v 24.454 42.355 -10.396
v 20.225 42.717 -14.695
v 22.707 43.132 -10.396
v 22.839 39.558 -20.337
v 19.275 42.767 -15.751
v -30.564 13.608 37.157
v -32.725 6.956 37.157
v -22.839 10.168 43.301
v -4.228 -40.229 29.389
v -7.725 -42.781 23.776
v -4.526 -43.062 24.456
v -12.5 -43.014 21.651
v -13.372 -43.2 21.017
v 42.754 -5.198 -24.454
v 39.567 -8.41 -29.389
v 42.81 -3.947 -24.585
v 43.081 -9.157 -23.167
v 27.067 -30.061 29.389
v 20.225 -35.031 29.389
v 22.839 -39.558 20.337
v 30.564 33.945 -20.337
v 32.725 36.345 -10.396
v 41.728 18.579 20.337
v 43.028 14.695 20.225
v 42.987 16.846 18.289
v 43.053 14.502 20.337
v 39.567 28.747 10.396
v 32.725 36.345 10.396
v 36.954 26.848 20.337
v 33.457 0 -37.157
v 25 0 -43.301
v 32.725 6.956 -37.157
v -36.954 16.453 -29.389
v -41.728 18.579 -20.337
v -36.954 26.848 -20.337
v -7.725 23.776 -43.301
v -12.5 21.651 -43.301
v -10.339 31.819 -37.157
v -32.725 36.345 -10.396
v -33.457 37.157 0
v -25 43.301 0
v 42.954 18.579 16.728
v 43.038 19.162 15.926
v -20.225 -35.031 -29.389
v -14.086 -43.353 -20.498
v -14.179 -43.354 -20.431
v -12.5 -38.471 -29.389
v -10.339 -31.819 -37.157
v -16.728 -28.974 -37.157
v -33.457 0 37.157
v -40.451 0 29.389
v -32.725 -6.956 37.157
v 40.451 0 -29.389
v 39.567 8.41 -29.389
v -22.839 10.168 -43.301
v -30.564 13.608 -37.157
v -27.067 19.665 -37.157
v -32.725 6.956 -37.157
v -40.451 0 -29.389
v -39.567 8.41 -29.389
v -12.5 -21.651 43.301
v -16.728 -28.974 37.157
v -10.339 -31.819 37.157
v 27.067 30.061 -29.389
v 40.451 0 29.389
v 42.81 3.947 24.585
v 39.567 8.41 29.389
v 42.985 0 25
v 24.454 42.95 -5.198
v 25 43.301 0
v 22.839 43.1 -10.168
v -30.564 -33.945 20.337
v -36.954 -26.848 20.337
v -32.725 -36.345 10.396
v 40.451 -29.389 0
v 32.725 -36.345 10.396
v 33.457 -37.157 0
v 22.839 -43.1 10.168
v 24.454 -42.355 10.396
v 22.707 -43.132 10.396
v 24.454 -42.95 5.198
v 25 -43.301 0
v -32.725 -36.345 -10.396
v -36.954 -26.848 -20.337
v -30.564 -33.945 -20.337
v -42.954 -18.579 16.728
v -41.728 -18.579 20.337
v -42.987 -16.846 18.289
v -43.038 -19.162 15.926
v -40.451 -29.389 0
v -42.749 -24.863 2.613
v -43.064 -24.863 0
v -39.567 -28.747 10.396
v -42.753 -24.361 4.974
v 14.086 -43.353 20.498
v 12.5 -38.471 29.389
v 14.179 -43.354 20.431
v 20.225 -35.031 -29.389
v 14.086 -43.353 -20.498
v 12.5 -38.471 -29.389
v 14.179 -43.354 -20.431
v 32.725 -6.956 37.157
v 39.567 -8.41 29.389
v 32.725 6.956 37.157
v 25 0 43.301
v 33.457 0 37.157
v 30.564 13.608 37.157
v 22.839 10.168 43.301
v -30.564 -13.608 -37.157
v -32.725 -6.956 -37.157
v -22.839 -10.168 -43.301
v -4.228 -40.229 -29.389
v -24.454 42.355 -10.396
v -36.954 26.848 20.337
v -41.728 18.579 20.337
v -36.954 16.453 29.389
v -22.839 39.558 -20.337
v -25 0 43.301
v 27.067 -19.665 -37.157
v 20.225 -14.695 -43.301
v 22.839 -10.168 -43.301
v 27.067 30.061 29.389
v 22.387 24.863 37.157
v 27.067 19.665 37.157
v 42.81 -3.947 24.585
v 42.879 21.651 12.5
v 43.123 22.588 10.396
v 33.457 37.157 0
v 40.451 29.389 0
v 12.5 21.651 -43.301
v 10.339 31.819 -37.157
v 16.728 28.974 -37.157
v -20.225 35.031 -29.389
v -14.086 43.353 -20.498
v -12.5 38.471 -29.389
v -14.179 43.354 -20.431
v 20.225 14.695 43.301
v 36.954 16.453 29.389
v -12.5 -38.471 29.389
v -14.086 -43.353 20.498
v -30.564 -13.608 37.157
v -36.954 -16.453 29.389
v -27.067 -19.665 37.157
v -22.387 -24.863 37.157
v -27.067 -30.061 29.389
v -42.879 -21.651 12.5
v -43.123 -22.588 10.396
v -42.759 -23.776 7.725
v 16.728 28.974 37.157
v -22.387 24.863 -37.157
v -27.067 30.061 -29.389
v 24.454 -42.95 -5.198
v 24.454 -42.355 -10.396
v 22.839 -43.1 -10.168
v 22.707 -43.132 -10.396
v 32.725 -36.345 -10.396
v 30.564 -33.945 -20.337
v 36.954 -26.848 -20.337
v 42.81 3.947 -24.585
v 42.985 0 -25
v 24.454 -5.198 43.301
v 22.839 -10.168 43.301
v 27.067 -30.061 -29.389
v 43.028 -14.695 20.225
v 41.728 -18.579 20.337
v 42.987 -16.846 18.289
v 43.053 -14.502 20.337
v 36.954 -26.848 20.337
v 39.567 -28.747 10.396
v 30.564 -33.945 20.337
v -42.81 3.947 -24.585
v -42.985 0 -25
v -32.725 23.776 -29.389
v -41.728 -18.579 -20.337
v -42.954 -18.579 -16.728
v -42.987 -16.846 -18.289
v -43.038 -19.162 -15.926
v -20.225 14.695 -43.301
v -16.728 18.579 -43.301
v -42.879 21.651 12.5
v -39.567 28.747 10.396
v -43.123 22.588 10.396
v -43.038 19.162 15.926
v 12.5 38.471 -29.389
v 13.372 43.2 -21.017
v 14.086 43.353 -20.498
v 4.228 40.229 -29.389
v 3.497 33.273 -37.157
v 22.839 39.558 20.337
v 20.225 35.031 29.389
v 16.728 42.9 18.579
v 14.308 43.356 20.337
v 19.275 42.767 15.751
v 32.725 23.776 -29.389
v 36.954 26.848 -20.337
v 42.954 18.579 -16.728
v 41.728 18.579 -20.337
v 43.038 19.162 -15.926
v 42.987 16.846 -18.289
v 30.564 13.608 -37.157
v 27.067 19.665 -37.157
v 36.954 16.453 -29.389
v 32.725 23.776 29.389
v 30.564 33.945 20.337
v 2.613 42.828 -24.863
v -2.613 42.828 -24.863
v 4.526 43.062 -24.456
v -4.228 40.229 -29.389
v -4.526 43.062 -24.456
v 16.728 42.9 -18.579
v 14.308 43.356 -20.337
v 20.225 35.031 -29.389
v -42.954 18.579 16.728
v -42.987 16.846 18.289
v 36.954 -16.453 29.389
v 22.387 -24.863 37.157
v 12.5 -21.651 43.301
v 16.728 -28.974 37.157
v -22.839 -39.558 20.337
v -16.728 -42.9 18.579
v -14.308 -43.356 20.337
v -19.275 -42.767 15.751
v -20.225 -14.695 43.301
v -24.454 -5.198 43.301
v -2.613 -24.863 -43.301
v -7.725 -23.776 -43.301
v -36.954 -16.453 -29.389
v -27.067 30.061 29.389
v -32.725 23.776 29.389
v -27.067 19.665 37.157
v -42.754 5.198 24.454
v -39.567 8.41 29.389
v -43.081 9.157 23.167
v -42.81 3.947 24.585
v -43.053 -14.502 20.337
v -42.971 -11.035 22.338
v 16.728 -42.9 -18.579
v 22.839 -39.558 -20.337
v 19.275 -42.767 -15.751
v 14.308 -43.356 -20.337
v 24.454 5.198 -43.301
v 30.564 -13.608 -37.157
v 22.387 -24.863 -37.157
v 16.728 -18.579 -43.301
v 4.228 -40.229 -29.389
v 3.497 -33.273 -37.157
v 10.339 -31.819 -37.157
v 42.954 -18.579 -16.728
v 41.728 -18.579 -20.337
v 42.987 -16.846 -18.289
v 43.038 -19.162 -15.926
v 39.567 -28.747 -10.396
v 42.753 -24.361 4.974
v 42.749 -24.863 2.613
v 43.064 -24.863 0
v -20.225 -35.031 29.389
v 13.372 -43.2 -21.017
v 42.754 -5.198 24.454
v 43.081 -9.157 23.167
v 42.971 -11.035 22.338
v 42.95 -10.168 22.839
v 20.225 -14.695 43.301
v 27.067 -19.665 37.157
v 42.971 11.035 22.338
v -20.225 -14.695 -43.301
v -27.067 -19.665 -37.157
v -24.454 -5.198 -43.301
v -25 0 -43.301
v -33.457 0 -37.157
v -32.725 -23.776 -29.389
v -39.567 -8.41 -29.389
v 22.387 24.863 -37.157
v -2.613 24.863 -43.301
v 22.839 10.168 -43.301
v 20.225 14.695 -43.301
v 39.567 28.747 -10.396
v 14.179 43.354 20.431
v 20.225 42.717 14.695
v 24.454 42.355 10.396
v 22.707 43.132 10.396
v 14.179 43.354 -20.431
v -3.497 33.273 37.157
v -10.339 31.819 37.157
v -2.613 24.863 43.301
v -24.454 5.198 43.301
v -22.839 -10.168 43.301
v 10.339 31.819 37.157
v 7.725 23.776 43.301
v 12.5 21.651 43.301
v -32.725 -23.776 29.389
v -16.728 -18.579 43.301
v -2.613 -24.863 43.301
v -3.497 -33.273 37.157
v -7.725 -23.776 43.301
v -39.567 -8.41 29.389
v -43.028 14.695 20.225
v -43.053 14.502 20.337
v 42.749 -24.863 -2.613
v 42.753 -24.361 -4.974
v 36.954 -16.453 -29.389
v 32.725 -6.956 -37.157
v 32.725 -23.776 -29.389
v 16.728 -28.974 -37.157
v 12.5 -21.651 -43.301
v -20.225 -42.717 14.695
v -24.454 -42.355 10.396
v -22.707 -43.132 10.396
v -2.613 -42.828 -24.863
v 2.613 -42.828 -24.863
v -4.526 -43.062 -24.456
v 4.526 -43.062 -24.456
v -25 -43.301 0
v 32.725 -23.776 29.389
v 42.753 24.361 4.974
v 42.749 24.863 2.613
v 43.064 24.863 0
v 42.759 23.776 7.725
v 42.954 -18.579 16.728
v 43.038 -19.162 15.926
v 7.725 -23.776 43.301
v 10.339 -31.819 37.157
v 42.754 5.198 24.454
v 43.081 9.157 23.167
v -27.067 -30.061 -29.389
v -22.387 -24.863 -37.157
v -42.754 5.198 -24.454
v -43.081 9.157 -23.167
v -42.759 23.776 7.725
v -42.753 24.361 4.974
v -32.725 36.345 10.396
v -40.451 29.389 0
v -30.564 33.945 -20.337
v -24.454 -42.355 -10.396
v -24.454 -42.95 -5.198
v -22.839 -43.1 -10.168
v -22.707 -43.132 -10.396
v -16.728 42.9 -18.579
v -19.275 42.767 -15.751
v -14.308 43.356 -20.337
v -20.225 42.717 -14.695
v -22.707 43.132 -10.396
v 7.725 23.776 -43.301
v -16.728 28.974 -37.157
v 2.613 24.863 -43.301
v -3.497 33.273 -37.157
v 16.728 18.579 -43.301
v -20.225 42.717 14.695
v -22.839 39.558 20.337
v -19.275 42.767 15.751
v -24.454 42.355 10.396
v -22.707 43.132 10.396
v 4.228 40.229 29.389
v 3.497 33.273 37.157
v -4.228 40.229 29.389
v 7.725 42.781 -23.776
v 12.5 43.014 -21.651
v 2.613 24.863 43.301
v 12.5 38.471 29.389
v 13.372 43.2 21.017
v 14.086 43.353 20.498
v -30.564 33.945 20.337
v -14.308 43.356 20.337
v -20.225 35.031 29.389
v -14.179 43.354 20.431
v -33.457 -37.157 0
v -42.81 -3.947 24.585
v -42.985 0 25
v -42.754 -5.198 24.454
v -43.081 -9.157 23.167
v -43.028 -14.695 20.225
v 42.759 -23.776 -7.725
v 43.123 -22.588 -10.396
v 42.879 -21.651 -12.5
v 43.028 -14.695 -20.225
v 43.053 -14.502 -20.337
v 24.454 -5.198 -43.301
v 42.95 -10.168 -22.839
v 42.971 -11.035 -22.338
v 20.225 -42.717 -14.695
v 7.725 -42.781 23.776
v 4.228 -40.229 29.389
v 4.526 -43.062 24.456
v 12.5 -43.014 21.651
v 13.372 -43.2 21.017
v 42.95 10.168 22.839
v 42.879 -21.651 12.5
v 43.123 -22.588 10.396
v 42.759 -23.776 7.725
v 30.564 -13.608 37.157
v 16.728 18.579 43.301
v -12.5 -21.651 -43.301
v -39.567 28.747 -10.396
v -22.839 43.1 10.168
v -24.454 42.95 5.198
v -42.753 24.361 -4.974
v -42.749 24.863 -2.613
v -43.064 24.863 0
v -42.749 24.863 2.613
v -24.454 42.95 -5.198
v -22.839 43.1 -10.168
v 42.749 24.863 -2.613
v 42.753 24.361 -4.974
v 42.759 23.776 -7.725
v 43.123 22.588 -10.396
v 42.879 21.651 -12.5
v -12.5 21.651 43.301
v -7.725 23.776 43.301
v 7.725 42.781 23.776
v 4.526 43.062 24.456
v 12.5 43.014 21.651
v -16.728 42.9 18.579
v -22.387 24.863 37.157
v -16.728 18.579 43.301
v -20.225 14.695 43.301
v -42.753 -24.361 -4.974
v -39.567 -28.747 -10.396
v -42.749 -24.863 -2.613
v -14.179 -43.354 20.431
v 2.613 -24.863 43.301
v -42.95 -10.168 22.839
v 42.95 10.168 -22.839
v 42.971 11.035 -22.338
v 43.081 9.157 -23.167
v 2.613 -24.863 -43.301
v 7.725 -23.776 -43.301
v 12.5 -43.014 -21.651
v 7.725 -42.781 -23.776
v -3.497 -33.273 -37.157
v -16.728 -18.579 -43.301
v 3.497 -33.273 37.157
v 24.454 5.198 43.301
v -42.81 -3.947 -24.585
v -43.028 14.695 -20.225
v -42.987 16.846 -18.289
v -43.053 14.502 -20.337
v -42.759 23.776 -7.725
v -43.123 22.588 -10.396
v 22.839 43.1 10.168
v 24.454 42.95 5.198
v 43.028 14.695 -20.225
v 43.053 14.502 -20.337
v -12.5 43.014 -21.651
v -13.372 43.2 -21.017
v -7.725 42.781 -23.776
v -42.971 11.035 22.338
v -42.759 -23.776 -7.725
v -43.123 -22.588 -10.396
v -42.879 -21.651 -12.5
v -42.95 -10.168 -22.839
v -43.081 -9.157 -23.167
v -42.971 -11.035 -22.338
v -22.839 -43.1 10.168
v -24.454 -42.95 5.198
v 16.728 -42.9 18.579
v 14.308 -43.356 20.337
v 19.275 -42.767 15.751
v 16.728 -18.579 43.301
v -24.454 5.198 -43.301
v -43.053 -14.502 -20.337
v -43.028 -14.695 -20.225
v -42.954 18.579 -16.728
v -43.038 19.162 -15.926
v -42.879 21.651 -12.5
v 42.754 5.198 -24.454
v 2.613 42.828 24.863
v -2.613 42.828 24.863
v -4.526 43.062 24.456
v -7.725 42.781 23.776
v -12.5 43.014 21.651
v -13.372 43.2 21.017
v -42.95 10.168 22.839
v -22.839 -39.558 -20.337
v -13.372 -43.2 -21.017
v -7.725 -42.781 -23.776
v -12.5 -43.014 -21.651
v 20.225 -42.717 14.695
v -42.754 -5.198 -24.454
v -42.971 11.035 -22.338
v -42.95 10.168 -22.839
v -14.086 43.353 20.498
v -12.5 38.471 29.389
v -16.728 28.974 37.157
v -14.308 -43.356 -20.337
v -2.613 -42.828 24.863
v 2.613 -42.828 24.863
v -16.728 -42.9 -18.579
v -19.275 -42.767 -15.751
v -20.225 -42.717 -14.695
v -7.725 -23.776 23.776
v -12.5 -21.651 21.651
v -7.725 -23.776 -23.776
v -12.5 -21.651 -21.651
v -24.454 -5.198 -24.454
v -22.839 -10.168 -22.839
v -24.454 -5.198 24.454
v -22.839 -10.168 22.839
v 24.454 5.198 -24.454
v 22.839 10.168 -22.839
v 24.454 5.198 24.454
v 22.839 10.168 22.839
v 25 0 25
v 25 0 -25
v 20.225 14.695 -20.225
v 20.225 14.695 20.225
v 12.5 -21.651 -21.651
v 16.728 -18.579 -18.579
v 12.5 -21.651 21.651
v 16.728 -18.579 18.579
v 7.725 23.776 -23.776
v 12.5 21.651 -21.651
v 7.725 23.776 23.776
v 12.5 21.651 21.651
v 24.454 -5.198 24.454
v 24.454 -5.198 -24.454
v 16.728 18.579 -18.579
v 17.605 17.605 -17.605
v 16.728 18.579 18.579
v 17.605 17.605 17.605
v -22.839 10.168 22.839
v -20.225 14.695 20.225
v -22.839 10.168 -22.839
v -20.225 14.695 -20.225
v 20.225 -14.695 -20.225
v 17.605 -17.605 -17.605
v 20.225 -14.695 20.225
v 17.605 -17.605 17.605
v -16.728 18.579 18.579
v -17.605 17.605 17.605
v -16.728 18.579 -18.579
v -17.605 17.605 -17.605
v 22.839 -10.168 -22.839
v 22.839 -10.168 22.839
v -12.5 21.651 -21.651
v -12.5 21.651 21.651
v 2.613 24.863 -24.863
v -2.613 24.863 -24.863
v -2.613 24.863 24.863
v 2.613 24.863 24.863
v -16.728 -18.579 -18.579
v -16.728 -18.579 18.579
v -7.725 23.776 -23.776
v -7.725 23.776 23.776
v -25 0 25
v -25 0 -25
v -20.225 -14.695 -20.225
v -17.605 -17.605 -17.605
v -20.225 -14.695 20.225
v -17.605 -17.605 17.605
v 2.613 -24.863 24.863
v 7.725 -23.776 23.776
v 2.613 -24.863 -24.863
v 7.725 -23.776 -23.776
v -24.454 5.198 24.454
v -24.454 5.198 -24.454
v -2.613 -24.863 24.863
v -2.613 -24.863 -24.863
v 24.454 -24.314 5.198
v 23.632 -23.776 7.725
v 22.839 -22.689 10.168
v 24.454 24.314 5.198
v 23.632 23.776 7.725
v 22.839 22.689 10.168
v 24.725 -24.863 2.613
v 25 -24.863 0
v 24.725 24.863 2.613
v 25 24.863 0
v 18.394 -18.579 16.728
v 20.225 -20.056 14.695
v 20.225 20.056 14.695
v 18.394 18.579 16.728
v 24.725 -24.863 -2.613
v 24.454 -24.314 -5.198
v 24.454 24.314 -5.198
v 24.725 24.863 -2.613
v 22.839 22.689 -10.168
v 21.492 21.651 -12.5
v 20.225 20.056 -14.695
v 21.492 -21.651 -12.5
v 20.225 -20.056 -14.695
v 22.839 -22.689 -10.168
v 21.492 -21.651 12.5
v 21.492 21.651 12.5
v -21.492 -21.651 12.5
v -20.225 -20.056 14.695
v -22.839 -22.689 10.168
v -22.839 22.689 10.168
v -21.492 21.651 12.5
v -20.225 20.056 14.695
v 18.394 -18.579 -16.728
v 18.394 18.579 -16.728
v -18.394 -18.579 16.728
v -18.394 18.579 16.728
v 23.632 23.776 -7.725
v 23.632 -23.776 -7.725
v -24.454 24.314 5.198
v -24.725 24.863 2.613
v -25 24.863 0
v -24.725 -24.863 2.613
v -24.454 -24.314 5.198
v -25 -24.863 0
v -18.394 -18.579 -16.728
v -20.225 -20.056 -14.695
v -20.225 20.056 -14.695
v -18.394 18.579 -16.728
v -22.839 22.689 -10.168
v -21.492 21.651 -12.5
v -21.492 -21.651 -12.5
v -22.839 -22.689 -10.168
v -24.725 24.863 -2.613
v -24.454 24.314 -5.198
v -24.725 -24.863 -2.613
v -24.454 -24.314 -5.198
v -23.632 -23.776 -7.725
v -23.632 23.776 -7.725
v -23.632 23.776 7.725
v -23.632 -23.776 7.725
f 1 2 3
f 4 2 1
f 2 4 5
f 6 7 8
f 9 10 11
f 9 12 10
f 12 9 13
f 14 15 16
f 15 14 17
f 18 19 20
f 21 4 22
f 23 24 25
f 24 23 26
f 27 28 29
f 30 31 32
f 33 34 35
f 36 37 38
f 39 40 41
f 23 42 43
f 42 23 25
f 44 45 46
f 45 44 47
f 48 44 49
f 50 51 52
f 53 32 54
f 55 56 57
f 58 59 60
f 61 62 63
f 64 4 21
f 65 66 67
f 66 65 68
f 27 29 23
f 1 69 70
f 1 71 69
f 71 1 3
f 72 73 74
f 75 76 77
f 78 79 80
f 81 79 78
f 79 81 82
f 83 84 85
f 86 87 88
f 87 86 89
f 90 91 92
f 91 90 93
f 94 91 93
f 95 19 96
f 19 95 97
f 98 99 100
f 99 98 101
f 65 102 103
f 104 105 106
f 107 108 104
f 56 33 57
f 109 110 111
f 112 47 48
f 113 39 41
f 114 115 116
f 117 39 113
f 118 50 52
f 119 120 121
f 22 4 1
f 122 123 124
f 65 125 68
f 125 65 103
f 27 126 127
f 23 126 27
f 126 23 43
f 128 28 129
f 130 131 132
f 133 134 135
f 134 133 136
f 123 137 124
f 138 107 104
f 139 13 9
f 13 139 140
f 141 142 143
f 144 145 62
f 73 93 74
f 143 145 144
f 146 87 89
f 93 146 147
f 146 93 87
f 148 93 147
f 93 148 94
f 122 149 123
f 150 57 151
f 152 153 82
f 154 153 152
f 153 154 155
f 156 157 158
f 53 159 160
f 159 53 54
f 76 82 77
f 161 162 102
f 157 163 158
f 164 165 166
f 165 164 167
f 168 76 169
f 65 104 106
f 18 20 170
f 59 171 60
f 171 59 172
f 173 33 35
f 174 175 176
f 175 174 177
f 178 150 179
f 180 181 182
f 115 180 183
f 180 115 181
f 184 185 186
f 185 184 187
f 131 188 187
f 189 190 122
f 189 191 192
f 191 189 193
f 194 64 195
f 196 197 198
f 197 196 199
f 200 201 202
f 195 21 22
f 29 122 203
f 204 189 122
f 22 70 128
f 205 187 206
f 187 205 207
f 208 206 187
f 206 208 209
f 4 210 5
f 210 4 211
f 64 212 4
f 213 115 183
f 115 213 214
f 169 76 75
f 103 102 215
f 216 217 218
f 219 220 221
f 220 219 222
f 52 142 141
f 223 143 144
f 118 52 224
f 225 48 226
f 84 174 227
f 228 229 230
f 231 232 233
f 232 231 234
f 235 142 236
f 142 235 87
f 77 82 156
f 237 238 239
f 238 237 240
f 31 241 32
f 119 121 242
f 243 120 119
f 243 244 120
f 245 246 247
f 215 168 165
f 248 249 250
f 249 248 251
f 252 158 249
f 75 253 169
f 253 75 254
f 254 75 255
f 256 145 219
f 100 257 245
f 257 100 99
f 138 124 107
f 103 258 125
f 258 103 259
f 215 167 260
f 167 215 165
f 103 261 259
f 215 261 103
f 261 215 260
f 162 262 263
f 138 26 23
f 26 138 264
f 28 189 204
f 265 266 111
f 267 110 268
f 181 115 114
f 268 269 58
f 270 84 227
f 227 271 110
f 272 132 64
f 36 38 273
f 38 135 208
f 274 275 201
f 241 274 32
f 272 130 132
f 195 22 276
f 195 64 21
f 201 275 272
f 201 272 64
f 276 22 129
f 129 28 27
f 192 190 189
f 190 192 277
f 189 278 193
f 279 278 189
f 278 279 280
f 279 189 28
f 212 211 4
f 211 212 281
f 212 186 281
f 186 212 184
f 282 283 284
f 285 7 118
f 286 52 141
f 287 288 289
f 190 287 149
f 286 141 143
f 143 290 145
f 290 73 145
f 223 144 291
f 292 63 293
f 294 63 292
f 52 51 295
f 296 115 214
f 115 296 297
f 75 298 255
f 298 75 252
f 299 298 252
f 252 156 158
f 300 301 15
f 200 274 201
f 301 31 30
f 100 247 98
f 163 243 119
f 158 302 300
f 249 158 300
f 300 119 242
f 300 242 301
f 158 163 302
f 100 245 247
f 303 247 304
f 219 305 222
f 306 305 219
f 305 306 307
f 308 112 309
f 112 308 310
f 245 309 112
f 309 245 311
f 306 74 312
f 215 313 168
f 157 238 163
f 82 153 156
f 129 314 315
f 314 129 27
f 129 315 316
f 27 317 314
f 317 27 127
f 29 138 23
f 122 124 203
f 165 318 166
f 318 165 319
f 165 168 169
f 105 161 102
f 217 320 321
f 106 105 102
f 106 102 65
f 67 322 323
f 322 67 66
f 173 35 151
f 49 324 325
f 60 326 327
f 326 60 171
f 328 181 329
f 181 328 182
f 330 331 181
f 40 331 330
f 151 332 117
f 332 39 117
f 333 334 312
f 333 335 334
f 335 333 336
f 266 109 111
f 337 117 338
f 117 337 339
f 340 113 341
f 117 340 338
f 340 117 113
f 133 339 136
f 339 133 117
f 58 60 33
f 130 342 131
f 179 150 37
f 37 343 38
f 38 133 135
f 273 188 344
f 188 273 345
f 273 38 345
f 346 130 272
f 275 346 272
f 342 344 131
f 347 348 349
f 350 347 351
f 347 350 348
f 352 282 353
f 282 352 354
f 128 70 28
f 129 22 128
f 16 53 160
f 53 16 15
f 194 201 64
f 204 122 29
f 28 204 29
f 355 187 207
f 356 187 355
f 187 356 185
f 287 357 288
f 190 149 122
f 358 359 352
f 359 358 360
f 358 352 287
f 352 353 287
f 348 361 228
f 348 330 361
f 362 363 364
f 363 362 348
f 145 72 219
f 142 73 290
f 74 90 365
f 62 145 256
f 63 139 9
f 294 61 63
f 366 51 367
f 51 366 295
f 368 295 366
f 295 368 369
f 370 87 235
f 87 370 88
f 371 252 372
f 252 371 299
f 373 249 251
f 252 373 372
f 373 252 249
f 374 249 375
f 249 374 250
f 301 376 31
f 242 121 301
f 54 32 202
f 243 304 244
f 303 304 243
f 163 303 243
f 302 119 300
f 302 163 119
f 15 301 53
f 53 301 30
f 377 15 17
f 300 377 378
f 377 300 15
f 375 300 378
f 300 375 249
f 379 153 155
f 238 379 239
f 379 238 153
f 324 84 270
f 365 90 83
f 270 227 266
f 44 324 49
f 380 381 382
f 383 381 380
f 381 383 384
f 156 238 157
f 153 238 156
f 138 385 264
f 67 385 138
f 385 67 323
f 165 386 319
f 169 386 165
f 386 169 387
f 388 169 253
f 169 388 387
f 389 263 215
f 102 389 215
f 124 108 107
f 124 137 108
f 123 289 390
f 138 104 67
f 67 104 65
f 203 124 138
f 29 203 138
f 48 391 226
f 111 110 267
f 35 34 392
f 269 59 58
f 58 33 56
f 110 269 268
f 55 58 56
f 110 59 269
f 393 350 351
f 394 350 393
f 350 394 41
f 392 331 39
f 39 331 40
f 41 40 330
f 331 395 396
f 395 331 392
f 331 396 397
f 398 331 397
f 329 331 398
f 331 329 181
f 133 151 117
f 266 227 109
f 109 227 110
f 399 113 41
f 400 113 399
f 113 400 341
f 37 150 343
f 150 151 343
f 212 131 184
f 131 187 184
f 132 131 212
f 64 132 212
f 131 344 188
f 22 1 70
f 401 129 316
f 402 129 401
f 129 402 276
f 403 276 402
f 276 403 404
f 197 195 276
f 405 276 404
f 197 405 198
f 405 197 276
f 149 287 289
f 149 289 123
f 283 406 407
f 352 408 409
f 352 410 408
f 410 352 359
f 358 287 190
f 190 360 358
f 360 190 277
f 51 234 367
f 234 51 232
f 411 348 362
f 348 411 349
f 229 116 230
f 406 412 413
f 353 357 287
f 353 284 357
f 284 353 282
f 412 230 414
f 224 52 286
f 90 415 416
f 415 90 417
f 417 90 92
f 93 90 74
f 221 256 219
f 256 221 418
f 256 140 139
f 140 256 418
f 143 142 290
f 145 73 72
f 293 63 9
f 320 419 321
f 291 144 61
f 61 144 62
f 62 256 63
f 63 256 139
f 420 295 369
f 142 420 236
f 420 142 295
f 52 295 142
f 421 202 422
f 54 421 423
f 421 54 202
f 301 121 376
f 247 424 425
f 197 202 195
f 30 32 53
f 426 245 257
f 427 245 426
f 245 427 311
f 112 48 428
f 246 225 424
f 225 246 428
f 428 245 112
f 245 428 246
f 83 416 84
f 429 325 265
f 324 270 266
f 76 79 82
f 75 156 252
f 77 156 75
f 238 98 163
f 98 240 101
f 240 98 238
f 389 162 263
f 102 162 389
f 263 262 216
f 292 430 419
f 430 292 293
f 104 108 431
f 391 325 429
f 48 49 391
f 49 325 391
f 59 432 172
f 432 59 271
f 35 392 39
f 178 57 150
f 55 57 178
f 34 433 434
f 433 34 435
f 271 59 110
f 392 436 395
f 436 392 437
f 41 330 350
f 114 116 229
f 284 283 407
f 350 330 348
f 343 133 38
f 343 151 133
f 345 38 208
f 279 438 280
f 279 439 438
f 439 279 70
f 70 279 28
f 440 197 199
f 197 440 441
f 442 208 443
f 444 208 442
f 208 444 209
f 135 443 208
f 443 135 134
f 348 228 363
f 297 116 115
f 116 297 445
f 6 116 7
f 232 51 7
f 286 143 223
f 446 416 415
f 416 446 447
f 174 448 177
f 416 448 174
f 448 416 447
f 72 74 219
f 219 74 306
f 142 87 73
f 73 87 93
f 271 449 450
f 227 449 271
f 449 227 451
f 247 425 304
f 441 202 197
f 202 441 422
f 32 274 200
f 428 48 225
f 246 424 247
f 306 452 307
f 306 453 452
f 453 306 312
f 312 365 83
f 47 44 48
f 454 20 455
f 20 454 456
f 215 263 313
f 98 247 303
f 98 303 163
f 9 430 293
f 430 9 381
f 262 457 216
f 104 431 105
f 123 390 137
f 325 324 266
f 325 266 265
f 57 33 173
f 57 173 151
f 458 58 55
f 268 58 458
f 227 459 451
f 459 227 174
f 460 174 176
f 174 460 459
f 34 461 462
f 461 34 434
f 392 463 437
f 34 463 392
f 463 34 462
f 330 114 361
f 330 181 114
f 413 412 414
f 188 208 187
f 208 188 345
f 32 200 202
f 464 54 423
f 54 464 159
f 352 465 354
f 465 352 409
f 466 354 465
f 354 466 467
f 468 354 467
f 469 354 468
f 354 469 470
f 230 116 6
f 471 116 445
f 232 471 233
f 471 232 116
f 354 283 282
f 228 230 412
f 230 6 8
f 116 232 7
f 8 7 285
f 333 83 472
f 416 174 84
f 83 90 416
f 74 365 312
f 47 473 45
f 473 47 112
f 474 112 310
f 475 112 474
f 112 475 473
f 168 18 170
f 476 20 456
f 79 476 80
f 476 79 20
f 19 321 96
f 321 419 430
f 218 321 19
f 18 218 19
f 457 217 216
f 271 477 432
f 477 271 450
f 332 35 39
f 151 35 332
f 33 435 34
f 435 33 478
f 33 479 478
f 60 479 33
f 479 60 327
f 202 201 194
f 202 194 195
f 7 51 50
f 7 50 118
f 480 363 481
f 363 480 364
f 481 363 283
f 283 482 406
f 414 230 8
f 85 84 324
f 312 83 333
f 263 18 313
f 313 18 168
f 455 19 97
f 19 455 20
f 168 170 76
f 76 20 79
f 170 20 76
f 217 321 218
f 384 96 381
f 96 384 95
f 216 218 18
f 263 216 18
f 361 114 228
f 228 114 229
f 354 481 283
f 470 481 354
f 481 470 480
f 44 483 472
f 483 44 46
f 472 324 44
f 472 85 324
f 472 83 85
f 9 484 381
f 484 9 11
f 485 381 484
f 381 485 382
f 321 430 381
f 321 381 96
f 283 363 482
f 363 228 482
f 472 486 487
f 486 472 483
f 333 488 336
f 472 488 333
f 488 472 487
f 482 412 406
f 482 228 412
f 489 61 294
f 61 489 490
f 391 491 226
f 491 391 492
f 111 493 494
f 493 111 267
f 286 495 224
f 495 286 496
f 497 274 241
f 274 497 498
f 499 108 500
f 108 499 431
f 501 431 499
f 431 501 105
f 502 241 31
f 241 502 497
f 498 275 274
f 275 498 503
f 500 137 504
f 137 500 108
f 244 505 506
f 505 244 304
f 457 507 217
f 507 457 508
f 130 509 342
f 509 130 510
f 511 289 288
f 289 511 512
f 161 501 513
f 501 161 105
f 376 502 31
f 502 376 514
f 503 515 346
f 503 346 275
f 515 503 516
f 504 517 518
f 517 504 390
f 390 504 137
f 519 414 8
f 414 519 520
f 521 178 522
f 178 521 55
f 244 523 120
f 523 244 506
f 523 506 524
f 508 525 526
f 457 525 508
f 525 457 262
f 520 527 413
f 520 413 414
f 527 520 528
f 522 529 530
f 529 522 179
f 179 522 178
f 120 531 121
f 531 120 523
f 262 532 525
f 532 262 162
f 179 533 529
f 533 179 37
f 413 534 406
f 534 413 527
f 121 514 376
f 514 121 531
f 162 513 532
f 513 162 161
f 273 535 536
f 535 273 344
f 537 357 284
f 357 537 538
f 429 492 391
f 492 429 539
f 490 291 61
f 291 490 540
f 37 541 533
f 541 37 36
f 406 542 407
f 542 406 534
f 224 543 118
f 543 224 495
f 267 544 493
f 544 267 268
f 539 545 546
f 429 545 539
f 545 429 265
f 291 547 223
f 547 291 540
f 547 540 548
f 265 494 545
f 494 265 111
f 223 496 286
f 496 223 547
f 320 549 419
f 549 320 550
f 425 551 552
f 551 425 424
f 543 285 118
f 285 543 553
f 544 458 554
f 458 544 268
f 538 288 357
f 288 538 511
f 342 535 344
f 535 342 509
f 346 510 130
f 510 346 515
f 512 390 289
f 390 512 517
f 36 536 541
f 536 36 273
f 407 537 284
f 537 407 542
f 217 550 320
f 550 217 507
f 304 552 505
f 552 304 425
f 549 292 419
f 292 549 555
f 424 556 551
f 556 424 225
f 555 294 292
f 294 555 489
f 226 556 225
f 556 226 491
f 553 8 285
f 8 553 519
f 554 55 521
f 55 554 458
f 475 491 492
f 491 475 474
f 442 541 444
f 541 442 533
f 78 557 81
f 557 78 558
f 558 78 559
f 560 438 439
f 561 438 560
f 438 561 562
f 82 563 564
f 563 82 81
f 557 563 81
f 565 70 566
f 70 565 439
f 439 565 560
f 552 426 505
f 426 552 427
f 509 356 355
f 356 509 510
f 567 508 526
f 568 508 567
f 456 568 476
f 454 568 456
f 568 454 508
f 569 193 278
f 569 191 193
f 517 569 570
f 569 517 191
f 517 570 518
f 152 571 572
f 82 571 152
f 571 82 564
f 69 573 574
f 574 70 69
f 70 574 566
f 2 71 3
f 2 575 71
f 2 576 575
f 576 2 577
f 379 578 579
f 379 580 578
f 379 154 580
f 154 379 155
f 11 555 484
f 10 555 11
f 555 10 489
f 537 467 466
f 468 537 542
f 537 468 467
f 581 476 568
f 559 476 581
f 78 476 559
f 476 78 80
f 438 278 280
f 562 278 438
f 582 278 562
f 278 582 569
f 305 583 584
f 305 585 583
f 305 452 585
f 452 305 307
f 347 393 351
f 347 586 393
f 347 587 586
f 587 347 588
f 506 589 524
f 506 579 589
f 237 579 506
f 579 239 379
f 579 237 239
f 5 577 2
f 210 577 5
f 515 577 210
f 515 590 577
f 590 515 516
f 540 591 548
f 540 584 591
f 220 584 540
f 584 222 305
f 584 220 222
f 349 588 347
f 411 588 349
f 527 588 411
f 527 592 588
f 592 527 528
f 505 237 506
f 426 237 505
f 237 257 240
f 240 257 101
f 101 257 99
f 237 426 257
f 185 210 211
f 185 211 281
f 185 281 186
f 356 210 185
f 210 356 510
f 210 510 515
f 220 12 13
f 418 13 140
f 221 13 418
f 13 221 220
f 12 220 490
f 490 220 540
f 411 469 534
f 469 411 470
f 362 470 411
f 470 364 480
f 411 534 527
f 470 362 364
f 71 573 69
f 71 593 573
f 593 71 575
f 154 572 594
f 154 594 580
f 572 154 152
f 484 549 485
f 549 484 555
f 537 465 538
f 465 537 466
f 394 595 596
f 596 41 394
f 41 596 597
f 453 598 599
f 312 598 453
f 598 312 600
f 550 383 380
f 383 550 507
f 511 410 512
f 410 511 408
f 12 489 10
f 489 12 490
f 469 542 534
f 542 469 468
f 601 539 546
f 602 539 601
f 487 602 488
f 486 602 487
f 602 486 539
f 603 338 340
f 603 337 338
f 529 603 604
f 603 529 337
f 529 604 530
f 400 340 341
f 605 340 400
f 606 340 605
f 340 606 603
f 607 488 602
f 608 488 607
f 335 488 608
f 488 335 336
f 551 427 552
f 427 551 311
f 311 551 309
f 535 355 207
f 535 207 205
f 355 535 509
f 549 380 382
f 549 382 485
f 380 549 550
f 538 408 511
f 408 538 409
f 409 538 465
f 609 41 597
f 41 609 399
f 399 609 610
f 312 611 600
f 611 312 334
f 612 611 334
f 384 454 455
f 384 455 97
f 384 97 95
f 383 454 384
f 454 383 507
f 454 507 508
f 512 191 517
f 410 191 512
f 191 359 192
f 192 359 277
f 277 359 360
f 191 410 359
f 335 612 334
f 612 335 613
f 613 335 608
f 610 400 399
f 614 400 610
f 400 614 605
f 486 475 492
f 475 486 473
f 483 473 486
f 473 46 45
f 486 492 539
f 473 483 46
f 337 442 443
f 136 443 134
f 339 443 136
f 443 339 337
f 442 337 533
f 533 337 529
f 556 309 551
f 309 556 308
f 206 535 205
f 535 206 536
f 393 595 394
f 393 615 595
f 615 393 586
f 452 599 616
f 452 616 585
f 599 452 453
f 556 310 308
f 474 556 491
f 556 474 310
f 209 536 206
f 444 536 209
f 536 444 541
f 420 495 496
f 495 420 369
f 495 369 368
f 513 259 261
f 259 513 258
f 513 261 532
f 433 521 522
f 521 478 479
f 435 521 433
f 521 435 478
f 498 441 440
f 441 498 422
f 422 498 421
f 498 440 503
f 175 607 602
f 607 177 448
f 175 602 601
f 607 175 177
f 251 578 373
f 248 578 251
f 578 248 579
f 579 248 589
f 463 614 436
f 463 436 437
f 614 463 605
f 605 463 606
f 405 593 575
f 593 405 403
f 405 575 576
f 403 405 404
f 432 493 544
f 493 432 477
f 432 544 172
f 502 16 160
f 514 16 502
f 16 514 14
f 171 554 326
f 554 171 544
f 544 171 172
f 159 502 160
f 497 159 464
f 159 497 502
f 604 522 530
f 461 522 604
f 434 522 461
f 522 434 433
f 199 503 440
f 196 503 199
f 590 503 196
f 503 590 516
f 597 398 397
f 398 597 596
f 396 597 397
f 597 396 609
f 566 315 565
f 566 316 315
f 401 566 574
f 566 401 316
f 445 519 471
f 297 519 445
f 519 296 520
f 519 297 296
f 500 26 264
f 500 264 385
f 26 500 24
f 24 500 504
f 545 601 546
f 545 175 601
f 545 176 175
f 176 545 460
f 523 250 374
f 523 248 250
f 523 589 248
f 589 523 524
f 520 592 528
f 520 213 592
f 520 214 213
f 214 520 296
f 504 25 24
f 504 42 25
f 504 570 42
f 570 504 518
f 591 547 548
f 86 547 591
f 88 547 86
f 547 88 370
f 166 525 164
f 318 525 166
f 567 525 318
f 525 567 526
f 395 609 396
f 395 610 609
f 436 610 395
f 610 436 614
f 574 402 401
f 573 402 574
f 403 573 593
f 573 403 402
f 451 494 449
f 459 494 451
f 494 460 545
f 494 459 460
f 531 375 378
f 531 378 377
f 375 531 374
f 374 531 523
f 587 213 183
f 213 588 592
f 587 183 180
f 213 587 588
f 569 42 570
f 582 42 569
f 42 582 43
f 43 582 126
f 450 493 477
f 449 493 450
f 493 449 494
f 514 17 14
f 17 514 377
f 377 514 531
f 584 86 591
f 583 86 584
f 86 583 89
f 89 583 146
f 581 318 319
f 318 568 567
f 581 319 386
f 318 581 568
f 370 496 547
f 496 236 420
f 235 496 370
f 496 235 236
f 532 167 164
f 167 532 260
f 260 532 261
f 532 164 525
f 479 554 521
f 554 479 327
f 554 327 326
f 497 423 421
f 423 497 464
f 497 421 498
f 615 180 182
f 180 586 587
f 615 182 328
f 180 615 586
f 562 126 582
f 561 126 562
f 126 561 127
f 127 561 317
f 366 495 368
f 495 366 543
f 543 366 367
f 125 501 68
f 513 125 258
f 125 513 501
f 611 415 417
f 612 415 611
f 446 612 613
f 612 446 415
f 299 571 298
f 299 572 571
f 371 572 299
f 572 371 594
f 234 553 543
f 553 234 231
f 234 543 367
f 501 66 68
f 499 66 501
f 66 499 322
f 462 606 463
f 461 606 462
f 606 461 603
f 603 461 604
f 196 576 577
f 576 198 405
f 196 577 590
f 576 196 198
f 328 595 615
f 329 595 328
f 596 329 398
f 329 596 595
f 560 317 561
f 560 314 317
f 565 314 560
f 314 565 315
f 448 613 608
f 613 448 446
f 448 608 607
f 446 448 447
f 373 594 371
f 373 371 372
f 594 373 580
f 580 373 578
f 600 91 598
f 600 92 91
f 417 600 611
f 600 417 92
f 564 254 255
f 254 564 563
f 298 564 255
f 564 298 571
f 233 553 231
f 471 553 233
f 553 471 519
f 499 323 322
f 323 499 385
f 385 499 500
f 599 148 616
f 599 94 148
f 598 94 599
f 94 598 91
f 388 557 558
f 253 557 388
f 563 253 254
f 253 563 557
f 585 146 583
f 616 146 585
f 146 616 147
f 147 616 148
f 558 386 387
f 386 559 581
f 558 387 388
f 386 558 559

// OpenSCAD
difference() {
    sphere(d=100);
    
    cylinder(d=50, h=125, center=true);
    #rotate([90, 0, 0]) cylinder(d=50, h=125, center=true);
    rotate([0, 90, 0]) cylinder(d=50, h=125, center=true);
}
